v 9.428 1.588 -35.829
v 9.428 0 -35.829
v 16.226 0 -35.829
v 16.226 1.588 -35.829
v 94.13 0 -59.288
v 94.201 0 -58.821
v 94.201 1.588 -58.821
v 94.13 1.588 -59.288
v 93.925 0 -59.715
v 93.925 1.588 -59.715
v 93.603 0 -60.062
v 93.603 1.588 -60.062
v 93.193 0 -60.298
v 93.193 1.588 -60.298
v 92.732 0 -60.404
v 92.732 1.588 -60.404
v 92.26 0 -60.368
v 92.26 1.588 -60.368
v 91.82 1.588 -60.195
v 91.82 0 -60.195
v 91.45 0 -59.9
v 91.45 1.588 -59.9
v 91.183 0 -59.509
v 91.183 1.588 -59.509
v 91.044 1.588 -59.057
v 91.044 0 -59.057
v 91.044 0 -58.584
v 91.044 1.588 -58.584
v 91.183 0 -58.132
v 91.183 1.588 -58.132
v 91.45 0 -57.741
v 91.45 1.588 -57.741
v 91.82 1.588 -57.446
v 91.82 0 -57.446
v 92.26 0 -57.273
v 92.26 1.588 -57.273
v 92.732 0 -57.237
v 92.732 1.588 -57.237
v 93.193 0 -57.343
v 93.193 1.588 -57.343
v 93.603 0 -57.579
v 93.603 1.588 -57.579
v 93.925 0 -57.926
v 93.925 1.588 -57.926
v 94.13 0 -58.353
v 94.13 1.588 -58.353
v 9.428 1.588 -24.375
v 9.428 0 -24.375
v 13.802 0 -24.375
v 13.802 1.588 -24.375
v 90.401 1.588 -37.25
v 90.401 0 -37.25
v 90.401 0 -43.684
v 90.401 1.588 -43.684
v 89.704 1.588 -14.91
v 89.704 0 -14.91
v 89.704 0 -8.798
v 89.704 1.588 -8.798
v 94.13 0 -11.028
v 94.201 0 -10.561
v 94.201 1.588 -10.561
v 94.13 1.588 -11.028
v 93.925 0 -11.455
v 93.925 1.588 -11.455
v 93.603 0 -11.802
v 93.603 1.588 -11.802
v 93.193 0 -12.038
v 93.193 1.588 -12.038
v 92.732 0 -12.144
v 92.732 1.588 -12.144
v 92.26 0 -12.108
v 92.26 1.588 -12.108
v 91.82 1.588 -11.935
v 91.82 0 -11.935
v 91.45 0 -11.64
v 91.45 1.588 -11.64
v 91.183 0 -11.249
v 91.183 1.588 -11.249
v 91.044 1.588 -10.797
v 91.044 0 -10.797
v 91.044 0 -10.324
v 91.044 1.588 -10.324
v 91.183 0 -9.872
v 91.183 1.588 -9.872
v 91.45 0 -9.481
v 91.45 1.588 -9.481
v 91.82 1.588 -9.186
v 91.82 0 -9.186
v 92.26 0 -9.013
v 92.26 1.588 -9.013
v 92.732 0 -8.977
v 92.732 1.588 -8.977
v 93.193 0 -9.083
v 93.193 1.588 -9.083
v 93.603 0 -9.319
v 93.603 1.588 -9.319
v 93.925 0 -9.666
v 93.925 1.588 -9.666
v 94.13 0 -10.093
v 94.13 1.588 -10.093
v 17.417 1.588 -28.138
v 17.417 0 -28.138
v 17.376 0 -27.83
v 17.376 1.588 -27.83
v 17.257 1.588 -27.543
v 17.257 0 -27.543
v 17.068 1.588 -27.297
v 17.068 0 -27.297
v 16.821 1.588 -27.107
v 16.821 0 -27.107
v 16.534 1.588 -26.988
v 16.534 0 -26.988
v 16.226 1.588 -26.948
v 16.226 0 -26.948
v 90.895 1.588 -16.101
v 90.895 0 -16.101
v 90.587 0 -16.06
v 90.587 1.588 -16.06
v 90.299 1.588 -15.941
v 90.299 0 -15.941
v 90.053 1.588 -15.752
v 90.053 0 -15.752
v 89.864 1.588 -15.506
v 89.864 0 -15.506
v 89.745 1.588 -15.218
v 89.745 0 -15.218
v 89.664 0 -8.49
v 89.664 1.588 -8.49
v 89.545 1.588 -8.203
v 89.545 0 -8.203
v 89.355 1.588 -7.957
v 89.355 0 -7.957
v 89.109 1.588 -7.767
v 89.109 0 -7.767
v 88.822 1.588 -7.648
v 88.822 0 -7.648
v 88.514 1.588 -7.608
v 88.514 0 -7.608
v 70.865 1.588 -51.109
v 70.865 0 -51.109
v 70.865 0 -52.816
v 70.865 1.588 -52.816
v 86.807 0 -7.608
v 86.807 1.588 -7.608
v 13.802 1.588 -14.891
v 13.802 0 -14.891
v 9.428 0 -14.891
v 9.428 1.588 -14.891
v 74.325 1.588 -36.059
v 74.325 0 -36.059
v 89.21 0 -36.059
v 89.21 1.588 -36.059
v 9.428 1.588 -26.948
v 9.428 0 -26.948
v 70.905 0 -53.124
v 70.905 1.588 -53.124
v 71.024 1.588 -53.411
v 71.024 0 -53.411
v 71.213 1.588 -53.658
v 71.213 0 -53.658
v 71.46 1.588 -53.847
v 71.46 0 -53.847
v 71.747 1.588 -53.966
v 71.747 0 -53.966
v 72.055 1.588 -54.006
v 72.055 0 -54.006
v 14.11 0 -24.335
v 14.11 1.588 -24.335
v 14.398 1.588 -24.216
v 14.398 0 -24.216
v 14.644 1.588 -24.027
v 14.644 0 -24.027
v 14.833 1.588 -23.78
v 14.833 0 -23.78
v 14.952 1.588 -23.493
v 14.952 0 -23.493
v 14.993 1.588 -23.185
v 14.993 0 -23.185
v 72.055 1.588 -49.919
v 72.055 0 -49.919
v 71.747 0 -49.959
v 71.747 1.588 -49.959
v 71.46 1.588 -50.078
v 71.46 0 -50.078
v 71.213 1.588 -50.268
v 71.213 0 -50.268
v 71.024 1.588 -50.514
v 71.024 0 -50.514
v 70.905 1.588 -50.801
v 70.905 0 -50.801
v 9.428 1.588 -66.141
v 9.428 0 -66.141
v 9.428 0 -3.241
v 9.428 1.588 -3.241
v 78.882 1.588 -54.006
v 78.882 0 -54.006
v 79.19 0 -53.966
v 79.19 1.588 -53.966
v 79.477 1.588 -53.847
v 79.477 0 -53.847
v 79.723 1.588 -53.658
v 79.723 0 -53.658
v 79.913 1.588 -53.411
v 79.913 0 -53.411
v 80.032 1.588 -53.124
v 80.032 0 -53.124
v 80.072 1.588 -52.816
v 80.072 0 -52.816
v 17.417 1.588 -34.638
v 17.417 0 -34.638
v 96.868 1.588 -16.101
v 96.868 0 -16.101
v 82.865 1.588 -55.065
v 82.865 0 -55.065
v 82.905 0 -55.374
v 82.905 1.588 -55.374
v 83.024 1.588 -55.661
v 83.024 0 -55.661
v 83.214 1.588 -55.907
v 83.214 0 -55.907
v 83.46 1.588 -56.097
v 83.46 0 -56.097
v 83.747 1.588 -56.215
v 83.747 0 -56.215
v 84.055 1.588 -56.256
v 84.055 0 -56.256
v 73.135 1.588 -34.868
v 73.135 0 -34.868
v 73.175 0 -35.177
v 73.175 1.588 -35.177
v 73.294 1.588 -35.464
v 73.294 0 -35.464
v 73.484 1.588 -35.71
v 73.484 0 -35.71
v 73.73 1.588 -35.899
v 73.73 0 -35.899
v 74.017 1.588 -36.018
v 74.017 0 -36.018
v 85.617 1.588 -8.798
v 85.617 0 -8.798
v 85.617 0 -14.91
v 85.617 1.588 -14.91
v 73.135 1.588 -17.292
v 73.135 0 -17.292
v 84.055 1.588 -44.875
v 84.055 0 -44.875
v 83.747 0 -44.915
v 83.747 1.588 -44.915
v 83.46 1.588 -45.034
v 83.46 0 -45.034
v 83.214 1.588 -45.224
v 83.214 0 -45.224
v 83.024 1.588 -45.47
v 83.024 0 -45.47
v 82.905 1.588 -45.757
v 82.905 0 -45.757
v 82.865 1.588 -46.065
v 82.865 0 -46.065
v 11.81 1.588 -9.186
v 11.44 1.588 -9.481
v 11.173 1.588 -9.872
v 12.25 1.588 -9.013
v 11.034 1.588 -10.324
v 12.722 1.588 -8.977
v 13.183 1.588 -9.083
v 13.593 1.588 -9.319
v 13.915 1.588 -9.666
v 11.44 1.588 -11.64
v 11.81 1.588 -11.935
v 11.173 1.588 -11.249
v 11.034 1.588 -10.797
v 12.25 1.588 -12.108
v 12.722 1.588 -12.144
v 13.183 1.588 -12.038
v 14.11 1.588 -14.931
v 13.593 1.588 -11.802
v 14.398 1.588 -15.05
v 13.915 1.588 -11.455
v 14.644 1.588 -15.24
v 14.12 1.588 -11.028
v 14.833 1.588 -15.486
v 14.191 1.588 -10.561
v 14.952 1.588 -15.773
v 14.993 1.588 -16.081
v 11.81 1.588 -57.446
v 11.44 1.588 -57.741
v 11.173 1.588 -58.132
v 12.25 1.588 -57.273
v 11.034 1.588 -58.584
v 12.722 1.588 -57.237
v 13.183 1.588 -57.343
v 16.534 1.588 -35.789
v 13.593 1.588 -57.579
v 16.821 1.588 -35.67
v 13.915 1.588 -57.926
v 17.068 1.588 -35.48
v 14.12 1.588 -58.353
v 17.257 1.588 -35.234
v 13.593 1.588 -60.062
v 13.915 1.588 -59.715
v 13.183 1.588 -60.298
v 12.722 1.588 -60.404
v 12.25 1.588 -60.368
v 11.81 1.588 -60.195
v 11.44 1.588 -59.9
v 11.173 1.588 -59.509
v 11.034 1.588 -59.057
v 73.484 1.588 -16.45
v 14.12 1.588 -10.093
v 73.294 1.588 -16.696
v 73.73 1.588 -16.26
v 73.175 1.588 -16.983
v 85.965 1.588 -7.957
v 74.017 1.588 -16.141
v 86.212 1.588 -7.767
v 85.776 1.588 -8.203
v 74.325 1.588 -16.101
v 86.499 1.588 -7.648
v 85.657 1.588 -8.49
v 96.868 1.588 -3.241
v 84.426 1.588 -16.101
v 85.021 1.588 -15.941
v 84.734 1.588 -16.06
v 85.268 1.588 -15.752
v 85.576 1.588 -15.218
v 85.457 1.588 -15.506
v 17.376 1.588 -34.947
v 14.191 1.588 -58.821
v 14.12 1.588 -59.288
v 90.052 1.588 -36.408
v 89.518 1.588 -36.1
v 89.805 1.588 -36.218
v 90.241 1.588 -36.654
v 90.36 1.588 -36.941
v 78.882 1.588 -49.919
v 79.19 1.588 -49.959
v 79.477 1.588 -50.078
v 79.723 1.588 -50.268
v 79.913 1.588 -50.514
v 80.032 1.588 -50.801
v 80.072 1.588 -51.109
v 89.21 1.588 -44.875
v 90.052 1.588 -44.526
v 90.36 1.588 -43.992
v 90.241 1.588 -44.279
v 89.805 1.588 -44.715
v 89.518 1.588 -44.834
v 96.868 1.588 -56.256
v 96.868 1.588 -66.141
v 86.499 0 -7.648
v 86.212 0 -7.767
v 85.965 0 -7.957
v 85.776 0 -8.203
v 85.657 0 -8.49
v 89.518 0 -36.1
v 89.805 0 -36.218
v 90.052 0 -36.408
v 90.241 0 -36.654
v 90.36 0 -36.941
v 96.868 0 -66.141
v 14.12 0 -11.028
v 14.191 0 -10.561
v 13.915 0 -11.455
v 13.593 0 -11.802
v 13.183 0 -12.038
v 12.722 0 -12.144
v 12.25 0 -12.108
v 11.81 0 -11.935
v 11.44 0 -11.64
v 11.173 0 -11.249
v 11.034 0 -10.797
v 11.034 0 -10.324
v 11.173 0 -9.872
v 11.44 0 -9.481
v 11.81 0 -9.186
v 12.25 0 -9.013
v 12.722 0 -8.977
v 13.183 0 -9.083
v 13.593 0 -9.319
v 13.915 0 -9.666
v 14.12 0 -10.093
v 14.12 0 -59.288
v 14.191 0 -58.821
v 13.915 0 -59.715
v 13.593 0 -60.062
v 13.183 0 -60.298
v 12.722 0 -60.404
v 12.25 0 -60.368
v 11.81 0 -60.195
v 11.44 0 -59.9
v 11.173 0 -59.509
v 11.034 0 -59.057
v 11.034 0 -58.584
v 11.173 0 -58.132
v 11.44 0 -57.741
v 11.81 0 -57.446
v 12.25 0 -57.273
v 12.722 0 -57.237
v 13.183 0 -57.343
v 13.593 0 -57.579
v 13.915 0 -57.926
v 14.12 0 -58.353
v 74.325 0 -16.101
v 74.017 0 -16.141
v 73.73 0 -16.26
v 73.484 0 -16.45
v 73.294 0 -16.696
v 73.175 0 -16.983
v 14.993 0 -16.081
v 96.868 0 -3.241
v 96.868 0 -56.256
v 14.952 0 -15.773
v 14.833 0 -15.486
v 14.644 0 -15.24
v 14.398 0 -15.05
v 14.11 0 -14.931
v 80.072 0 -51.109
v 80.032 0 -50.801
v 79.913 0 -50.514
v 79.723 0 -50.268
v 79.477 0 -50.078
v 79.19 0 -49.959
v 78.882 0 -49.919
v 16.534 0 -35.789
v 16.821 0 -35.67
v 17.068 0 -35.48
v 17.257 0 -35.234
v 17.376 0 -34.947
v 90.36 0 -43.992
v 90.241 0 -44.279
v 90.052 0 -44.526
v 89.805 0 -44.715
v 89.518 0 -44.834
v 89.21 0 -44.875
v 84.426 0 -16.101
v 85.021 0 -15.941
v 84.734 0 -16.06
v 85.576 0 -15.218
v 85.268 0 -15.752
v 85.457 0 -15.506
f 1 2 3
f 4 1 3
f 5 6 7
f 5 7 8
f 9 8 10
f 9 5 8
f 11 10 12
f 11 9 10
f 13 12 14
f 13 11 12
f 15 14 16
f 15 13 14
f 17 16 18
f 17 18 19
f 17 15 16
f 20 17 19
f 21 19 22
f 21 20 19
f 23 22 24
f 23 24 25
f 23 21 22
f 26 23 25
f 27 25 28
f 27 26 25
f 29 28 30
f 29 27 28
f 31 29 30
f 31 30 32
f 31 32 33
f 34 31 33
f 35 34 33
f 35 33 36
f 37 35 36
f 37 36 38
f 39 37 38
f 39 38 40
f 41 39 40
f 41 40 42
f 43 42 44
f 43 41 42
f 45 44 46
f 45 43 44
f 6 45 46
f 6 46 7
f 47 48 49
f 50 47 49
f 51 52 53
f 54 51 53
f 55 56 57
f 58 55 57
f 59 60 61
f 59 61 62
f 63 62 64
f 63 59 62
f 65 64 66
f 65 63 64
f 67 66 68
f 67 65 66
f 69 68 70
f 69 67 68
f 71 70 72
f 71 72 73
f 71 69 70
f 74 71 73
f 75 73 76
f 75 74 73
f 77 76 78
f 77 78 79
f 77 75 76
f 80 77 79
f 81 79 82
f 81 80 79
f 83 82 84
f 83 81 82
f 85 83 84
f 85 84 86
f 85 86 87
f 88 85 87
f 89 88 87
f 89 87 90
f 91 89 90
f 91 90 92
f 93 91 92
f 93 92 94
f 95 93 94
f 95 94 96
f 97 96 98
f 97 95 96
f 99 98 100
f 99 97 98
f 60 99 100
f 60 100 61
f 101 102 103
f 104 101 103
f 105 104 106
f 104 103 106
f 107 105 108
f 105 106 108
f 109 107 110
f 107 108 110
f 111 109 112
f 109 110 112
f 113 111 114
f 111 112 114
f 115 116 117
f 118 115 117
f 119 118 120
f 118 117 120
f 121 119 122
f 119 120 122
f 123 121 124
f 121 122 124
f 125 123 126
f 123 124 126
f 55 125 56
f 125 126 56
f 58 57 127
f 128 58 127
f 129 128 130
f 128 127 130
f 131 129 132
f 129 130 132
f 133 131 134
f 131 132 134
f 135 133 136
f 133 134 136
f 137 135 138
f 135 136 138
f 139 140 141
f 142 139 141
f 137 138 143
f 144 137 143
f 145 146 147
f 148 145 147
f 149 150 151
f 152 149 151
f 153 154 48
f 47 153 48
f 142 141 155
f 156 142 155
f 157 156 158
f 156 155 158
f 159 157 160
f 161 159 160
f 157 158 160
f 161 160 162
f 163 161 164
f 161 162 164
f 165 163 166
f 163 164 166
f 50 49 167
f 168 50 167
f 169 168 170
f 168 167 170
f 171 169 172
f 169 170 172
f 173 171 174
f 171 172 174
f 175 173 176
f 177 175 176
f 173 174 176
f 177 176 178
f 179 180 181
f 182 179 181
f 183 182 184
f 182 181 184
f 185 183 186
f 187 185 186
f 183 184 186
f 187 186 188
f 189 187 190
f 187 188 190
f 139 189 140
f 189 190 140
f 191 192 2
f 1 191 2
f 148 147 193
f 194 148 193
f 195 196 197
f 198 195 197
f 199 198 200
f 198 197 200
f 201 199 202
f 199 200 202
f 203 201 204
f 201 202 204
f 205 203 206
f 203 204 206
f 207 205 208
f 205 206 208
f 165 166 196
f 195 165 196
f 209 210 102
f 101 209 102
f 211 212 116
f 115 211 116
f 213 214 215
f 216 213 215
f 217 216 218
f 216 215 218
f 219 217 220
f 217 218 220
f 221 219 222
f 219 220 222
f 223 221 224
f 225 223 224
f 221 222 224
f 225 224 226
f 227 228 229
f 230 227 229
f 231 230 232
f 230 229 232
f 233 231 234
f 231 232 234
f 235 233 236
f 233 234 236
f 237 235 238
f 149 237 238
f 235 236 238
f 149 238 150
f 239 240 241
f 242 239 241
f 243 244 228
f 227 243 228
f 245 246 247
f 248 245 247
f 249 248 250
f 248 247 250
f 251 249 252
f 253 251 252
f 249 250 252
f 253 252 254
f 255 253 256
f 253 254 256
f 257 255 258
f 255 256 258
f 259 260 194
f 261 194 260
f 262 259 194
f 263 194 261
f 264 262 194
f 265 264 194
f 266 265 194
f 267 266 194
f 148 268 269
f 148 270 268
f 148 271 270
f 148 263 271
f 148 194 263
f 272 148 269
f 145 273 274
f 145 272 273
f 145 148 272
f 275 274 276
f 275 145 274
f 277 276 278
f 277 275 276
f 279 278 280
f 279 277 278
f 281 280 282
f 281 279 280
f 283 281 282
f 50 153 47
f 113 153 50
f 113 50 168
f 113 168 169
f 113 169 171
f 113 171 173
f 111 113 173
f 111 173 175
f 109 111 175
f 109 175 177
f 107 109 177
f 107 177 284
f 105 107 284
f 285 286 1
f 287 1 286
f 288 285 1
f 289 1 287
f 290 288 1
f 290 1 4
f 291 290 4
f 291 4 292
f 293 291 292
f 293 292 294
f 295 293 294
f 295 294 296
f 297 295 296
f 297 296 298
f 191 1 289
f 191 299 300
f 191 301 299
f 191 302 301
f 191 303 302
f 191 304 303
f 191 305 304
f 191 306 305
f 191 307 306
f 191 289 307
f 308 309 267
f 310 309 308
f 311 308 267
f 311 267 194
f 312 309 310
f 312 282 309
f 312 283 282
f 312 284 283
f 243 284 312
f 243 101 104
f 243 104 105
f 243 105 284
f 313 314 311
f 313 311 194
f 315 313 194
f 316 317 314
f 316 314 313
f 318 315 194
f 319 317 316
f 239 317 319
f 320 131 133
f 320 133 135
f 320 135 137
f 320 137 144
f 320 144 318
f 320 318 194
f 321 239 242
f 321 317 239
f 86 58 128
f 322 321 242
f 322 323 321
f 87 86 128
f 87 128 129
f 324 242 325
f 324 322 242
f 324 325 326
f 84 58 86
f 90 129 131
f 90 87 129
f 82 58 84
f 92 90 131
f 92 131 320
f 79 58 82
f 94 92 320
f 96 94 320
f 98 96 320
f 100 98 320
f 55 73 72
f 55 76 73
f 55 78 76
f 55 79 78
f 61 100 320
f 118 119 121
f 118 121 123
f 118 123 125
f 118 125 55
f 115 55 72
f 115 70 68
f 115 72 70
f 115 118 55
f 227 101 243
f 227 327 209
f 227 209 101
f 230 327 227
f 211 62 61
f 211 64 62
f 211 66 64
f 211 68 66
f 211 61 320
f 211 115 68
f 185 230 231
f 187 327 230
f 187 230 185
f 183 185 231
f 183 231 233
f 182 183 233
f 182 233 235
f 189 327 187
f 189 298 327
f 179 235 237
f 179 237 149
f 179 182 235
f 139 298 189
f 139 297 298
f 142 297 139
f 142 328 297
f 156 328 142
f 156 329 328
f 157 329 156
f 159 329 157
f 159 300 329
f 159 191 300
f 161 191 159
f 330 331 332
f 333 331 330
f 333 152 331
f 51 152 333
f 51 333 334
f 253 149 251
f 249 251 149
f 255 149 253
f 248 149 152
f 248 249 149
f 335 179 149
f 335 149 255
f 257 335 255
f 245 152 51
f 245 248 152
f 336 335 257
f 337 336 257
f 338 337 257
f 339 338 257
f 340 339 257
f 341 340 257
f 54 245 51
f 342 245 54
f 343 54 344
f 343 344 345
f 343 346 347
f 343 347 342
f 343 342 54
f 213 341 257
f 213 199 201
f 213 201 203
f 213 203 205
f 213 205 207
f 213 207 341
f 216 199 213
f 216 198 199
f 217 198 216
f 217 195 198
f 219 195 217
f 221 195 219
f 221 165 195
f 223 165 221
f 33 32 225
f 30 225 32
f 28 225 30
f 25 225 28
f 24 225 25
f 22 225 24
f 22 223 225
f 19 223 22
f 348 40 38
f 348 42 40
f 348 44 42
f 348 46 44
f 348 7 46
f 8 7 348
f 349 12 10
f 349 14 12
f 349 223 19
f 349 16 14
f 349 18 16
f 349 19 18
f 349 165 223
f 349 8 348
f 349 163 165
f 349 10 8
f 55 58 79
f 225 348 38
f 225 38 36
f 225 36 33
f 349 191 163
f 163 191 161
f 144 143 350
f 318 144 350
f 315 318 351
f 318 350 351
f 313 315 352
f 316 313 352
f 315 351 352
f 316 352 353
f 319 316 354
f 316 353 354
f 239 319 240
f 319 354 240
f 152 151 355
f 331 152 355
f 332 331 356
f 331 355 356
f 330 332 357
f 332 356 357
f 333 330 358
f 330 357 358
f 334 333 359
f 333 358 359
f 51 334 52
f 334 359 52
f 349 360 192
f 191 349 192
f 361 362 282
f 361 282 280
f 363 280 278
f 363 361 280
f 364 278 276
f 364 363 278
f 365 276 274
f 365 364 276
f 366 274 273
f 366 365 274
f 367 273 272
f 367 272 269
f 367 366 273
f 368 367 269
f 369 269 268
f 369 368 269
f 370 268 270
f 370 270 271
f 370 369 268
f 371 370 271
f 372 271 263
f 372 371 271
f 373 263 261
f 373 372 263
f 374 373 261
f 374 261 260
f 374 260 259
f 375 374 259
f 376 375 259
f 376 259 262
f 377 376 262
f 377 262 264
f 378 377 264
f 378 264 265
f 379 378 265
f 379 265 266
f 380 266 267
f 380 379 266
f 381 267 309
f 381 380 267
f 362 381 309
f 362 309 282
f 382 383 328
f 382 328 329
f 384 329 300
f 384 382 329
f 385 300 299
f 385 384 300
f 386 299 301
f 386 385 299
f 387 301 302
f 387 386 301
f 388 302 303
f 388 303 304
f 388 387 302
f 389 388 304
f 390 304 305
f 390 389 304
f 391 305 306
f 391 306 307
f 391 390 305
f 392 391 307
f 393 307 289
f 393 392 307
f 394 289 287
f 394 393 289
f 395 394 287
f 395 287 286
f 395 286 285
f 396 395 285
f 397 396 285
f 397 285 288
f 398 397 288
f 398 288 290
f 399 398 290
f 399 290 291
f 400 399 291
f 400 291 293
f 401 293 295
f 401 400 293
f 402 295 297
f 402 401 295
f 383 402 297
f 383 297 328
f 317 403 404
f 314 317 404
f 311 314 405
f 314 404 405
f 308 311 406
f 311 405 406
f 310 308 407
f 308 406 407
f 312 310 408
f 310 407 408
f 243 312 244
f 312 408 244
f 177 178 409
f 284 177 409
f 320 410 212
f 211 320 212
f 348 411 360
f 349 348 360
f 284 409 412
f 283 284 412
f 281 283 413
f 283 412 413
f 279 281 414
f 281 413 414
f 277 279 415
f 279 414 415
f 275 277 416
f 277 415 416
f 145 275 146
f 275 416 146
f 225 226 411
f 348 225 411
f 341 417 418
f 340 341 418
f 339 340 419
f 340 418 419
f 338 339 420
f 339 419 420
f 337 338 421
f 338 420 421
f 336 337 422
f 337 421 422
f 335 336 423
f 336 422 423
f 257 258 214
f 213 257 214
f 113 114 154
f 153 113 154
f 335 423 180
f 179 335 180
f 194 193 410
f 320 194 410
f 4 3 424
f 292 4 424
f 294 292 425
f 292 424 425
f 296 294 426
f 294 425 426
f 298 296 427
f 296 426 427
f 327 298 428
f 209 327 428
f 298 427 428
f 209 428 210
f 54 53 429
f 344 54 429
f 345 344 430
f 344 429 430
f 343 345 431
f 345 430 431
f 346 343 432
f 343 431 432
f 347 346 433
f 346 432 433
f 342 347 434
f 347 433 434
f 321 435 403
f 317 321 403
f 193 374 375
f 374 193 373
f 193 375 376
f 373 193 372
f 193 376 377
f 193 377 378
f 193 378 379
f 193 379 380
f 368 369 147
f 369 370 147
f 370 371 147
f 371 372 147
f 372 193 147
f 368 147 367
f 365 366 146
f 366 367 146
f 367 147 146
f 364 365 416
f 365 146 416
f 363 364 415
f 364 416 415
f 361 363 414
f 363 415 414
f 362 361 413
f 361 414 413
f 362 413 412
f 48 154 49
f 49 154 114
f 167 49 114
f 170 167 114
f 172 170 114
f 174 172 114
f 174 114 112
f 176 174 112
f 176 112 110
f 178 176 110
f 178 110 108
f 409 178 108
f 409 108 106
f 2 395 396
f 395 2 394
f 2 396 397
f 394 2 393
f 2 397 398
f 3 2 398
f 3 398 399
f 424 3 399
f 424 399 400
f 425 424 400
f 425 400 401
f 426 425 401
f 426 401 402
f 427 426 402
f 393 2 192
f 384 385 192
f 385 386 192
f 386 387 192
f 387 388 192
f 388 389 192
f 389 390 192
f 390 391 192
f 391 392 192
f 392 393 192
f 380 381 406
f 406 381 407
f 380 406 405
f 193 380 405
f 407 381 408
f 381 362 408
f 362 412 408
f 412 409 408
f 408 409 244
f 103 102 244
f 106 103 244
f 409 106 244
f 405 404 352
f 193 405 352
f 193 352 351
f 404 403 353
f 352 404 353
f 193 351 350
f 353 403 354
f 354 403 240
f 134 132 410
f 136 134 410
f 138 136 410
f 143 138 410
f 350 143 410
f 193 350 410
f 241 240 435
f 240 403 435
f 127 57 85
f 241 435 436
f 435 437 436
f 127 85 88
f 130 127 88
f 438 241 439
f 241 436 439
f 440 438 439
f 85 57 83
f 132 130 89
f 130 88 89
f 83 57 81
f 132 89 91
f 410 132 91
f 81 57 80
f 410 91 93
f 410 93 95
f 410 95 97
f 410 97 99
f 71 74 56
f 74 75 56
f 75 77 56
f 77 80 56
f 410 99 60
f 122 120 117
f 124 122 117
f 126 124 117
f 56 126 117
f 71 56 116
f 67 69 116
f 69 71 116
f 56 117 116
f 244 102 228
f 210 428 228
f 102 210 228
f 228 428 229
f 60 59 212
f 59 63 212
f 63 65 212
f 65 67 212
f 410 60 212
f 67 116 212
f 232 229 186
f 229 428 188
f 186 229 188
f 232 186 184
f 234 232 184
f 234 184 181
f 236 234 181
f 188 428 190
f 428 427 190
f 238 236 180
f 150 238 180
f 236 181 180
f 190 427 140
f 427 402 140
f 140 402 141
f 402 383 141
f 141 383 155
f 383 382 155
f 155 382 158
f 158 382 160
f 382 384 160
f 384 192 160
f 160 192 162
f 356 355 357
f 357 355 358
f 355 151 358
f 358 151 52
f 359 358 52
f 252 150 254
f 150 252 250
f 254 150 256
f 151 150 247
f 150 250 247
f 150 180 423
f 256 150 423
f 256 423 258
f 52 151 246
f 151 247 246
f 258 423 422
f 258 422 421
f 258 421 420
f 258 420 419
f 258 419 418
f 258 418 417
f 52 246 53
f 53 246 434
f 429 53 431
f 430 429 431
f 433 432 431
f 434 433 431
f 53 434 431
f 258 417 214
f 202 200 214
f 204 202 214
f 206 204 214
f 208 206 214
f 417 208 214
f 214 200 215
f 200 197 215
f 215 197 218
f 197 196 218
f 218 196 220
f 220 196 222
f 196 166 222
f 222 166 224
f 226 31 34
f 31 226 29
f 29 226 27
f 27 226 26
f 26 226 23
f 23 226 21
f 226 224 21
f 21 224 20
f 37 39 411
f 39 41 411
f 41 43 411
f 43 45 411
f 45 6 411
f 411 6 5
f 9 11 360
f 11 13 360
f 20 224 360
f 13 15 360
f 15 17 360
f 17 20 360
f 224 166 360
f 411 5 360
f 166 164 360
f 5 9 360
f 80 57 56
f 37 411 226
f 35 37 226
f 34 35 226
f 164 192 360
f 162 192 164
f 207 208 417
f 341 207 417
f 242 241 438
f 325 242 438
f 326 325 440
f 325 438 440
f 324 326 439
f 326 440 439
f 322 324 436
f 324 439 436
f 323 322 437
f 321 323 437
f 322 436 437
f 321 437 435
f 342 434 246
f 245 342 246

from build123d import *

# Parameters (mm, degrees)
SKETCH1_R           = 1.5875
BOSS_EXTRUDE1_DEPTH = 1.5875


with BuildPart() as part:
    # Sketch1 → Boss-Extrude1 (new body)
    with BuildSketch(Plane(origin=(0, 0, 0), x_dir=(1, 0, 0), z_dir=(0, 1, 0))):
        with BuildLine():
            Line((96.867912936, 16.100919196), (90.894787936, 16.100919196))
            ThreePointArc((90.894787936, 16.100919196), (90.052888924, 15.752193207), (89.704162936, 14.910294196))
            Line((89.704162936, 14.910294196), (89.704162936, 8.798419196))
            ThreePointArc((89.704162936, 8.798419196), (89.355436947, 7.956520185), (88.513537936, 7.607794196))
            Line((88.513537936, 7.607794196), (86.807287936, 7.607794196))
            ThreePointArc((86.807287936, 7.607794196), (85.965388924, 7.956520185), (85.616662936, 8.798419196))
            Line((85.616662936, 8.798419196), (85.616662936, 14.910294196))
            ThreePointArc((85.616662936, 14.910294196), (85.267936947, 15.752193207), (84.426037936, 16.100919196))
            Line((84.426037936, 16.100919196), (74.325412936, 16.100919196))
            ThreePointArc((74.325412936, 16.100919196), (73.483513924, 16.449645185), (73.134787936, 17.291544196))
            Line((73.134787936, 17.291544196), (73.134787936, 34.868344196))
            ThreePointArc((73.134787936, 34.868344196), (73.483513924, 35.710243207), (74.325412936, 36.058969196))
            Line((74.325412936, 36.058969196), (89.210056936, 36.058969196))
            ThreePointArc((89.210056936, 36.058969196), (90.051955947, 36.407695185), (90.400681936, 37.249594196))
            Line((90.400681936, 37.249594196), (90.400681936, 43.684176196))
            ThreePointArc((90.400681936, 43.684176196), (90.051955947, 44.526075207), (89.210056936, 44.874801196))
            Line((89.210056936, 44.874801196), (84.055412936, 44.874801196))
            ThreePointArc((84.055412936, 44.874801196), (83.213513924, 45.223527185), (82.864787936, 46.065426196))
            Line((82.864787936, 46.065426196), (82.864787936, 55.065426196))
            ThreePointArc((82.864787936, 55.065426196), (83.213513924, 55.907325207), (84.055412936, 56.256051196))
            Line((84.055412936, 56.256051196), (96.867912936, 56.256051196))
            Line((96.867912936, 56.256051196), (96.867912936, 66.140544196))
            Line((96.867912936, 66.140544196), (9.428412936, 66.140544196))
            Line((9.428412936, 66.140544196), (9.428412936, 35.829099196))
            Line((9.428412936, 35.829099196), (16.226102936, 35.829099196))
            ThreePointArc((16.226102936, 35.829099196), (17.068001947, 35.480373207), (17.416727936, 34.638474196))
            Line((17.416727936, 34.638474196), (17.416727936, 28.138474196))
            ThreePointArc((17.416727936, 28.138474196), (17.068001947, 27.296575185), (16.226102936, 26.947849196))
            Line((16.226102936, 26.947849196), (9.428412936, 26.947849196))
            Line((9.428412936, 26.947849196), (9.428412936, 24.375238196))
            Line((9.428412936, 24.375238196), (13.802302936, 24.375238196))
            ThreePointArc((13.802302936, 24.375238196), (14.644201947, 24.026512207), (14.992927936, 23.184613196))
            Line((14.992927936, 23.184613196), (14.992927936, 16.081488196))
            ThreePointArc((14.992927936, 16.081488196), (14.644201947, 15.239589185), (13.802302936, 14.890863196))
            Line((13.802302936, 14.890863196), (9.428412936, 14.890863196))
            Line((9.428412936, 14.890863196), (9.428412936, 3.240544196))
            Line((9.428412936, 3.240544196), (96.867912936, 3.240544196))
            Line((96.867912936, 3.240544196), (96.867912936, 16.100919196))
        make_face()
        with Locations((92.613412936, 58.820544196)):
            Circle(SKETCH1_R, mode=Mode.SUBTRACT)
        with Locations((12.603412936, 10.560544196)):
            Circle(SKETCH1_R, mode=Mode.SUBTRACT)
        with Locations((92.613412936, 10.560544196)):
            Circle(SKETCH1_R, mode=Mode.SUBTRACT)
        with Locations((12.603412936, 58.820544196)):
            Circle(SKETCH1_R, mode=Mode.SUBTRACT)
        with BuildLine():
            Line((78.881537936, 49.918794196), (72.055287936, 49.918794196))
            ThreePointArc((72.055287936, 49.918794196), (71.213388924, 50.267520185), (70.864662936, 51.109419196))
            Line((70.864662936, 51.109419196), (70.864662936, 52.815669196))
            ThreePointArc((70.864662936, 52.815669196), (71.213388924, 53.657568207), (72.055287936, 54.006294196))
            Line((72.055287936, 54.006294196), (78.881537936, 54.006294196))
            ThreePointArc((78.881537936, 54.006294196), (79.723436947, 53.657568207), (80.072162936, 52.815669196))
            Line((80.072162936, 52.815669196), (80.072162936, 51.109419196))
            ThreePointArc((80.072162936, 51.109419196), (79.723436947, 50.267520185), (78.881537936, 49.918794196))
        make_face(mode=Mode.SUBTRACT)
    extrude(amount=BOSS_EXTRUDE1_DEPTH)


solid = part.part
